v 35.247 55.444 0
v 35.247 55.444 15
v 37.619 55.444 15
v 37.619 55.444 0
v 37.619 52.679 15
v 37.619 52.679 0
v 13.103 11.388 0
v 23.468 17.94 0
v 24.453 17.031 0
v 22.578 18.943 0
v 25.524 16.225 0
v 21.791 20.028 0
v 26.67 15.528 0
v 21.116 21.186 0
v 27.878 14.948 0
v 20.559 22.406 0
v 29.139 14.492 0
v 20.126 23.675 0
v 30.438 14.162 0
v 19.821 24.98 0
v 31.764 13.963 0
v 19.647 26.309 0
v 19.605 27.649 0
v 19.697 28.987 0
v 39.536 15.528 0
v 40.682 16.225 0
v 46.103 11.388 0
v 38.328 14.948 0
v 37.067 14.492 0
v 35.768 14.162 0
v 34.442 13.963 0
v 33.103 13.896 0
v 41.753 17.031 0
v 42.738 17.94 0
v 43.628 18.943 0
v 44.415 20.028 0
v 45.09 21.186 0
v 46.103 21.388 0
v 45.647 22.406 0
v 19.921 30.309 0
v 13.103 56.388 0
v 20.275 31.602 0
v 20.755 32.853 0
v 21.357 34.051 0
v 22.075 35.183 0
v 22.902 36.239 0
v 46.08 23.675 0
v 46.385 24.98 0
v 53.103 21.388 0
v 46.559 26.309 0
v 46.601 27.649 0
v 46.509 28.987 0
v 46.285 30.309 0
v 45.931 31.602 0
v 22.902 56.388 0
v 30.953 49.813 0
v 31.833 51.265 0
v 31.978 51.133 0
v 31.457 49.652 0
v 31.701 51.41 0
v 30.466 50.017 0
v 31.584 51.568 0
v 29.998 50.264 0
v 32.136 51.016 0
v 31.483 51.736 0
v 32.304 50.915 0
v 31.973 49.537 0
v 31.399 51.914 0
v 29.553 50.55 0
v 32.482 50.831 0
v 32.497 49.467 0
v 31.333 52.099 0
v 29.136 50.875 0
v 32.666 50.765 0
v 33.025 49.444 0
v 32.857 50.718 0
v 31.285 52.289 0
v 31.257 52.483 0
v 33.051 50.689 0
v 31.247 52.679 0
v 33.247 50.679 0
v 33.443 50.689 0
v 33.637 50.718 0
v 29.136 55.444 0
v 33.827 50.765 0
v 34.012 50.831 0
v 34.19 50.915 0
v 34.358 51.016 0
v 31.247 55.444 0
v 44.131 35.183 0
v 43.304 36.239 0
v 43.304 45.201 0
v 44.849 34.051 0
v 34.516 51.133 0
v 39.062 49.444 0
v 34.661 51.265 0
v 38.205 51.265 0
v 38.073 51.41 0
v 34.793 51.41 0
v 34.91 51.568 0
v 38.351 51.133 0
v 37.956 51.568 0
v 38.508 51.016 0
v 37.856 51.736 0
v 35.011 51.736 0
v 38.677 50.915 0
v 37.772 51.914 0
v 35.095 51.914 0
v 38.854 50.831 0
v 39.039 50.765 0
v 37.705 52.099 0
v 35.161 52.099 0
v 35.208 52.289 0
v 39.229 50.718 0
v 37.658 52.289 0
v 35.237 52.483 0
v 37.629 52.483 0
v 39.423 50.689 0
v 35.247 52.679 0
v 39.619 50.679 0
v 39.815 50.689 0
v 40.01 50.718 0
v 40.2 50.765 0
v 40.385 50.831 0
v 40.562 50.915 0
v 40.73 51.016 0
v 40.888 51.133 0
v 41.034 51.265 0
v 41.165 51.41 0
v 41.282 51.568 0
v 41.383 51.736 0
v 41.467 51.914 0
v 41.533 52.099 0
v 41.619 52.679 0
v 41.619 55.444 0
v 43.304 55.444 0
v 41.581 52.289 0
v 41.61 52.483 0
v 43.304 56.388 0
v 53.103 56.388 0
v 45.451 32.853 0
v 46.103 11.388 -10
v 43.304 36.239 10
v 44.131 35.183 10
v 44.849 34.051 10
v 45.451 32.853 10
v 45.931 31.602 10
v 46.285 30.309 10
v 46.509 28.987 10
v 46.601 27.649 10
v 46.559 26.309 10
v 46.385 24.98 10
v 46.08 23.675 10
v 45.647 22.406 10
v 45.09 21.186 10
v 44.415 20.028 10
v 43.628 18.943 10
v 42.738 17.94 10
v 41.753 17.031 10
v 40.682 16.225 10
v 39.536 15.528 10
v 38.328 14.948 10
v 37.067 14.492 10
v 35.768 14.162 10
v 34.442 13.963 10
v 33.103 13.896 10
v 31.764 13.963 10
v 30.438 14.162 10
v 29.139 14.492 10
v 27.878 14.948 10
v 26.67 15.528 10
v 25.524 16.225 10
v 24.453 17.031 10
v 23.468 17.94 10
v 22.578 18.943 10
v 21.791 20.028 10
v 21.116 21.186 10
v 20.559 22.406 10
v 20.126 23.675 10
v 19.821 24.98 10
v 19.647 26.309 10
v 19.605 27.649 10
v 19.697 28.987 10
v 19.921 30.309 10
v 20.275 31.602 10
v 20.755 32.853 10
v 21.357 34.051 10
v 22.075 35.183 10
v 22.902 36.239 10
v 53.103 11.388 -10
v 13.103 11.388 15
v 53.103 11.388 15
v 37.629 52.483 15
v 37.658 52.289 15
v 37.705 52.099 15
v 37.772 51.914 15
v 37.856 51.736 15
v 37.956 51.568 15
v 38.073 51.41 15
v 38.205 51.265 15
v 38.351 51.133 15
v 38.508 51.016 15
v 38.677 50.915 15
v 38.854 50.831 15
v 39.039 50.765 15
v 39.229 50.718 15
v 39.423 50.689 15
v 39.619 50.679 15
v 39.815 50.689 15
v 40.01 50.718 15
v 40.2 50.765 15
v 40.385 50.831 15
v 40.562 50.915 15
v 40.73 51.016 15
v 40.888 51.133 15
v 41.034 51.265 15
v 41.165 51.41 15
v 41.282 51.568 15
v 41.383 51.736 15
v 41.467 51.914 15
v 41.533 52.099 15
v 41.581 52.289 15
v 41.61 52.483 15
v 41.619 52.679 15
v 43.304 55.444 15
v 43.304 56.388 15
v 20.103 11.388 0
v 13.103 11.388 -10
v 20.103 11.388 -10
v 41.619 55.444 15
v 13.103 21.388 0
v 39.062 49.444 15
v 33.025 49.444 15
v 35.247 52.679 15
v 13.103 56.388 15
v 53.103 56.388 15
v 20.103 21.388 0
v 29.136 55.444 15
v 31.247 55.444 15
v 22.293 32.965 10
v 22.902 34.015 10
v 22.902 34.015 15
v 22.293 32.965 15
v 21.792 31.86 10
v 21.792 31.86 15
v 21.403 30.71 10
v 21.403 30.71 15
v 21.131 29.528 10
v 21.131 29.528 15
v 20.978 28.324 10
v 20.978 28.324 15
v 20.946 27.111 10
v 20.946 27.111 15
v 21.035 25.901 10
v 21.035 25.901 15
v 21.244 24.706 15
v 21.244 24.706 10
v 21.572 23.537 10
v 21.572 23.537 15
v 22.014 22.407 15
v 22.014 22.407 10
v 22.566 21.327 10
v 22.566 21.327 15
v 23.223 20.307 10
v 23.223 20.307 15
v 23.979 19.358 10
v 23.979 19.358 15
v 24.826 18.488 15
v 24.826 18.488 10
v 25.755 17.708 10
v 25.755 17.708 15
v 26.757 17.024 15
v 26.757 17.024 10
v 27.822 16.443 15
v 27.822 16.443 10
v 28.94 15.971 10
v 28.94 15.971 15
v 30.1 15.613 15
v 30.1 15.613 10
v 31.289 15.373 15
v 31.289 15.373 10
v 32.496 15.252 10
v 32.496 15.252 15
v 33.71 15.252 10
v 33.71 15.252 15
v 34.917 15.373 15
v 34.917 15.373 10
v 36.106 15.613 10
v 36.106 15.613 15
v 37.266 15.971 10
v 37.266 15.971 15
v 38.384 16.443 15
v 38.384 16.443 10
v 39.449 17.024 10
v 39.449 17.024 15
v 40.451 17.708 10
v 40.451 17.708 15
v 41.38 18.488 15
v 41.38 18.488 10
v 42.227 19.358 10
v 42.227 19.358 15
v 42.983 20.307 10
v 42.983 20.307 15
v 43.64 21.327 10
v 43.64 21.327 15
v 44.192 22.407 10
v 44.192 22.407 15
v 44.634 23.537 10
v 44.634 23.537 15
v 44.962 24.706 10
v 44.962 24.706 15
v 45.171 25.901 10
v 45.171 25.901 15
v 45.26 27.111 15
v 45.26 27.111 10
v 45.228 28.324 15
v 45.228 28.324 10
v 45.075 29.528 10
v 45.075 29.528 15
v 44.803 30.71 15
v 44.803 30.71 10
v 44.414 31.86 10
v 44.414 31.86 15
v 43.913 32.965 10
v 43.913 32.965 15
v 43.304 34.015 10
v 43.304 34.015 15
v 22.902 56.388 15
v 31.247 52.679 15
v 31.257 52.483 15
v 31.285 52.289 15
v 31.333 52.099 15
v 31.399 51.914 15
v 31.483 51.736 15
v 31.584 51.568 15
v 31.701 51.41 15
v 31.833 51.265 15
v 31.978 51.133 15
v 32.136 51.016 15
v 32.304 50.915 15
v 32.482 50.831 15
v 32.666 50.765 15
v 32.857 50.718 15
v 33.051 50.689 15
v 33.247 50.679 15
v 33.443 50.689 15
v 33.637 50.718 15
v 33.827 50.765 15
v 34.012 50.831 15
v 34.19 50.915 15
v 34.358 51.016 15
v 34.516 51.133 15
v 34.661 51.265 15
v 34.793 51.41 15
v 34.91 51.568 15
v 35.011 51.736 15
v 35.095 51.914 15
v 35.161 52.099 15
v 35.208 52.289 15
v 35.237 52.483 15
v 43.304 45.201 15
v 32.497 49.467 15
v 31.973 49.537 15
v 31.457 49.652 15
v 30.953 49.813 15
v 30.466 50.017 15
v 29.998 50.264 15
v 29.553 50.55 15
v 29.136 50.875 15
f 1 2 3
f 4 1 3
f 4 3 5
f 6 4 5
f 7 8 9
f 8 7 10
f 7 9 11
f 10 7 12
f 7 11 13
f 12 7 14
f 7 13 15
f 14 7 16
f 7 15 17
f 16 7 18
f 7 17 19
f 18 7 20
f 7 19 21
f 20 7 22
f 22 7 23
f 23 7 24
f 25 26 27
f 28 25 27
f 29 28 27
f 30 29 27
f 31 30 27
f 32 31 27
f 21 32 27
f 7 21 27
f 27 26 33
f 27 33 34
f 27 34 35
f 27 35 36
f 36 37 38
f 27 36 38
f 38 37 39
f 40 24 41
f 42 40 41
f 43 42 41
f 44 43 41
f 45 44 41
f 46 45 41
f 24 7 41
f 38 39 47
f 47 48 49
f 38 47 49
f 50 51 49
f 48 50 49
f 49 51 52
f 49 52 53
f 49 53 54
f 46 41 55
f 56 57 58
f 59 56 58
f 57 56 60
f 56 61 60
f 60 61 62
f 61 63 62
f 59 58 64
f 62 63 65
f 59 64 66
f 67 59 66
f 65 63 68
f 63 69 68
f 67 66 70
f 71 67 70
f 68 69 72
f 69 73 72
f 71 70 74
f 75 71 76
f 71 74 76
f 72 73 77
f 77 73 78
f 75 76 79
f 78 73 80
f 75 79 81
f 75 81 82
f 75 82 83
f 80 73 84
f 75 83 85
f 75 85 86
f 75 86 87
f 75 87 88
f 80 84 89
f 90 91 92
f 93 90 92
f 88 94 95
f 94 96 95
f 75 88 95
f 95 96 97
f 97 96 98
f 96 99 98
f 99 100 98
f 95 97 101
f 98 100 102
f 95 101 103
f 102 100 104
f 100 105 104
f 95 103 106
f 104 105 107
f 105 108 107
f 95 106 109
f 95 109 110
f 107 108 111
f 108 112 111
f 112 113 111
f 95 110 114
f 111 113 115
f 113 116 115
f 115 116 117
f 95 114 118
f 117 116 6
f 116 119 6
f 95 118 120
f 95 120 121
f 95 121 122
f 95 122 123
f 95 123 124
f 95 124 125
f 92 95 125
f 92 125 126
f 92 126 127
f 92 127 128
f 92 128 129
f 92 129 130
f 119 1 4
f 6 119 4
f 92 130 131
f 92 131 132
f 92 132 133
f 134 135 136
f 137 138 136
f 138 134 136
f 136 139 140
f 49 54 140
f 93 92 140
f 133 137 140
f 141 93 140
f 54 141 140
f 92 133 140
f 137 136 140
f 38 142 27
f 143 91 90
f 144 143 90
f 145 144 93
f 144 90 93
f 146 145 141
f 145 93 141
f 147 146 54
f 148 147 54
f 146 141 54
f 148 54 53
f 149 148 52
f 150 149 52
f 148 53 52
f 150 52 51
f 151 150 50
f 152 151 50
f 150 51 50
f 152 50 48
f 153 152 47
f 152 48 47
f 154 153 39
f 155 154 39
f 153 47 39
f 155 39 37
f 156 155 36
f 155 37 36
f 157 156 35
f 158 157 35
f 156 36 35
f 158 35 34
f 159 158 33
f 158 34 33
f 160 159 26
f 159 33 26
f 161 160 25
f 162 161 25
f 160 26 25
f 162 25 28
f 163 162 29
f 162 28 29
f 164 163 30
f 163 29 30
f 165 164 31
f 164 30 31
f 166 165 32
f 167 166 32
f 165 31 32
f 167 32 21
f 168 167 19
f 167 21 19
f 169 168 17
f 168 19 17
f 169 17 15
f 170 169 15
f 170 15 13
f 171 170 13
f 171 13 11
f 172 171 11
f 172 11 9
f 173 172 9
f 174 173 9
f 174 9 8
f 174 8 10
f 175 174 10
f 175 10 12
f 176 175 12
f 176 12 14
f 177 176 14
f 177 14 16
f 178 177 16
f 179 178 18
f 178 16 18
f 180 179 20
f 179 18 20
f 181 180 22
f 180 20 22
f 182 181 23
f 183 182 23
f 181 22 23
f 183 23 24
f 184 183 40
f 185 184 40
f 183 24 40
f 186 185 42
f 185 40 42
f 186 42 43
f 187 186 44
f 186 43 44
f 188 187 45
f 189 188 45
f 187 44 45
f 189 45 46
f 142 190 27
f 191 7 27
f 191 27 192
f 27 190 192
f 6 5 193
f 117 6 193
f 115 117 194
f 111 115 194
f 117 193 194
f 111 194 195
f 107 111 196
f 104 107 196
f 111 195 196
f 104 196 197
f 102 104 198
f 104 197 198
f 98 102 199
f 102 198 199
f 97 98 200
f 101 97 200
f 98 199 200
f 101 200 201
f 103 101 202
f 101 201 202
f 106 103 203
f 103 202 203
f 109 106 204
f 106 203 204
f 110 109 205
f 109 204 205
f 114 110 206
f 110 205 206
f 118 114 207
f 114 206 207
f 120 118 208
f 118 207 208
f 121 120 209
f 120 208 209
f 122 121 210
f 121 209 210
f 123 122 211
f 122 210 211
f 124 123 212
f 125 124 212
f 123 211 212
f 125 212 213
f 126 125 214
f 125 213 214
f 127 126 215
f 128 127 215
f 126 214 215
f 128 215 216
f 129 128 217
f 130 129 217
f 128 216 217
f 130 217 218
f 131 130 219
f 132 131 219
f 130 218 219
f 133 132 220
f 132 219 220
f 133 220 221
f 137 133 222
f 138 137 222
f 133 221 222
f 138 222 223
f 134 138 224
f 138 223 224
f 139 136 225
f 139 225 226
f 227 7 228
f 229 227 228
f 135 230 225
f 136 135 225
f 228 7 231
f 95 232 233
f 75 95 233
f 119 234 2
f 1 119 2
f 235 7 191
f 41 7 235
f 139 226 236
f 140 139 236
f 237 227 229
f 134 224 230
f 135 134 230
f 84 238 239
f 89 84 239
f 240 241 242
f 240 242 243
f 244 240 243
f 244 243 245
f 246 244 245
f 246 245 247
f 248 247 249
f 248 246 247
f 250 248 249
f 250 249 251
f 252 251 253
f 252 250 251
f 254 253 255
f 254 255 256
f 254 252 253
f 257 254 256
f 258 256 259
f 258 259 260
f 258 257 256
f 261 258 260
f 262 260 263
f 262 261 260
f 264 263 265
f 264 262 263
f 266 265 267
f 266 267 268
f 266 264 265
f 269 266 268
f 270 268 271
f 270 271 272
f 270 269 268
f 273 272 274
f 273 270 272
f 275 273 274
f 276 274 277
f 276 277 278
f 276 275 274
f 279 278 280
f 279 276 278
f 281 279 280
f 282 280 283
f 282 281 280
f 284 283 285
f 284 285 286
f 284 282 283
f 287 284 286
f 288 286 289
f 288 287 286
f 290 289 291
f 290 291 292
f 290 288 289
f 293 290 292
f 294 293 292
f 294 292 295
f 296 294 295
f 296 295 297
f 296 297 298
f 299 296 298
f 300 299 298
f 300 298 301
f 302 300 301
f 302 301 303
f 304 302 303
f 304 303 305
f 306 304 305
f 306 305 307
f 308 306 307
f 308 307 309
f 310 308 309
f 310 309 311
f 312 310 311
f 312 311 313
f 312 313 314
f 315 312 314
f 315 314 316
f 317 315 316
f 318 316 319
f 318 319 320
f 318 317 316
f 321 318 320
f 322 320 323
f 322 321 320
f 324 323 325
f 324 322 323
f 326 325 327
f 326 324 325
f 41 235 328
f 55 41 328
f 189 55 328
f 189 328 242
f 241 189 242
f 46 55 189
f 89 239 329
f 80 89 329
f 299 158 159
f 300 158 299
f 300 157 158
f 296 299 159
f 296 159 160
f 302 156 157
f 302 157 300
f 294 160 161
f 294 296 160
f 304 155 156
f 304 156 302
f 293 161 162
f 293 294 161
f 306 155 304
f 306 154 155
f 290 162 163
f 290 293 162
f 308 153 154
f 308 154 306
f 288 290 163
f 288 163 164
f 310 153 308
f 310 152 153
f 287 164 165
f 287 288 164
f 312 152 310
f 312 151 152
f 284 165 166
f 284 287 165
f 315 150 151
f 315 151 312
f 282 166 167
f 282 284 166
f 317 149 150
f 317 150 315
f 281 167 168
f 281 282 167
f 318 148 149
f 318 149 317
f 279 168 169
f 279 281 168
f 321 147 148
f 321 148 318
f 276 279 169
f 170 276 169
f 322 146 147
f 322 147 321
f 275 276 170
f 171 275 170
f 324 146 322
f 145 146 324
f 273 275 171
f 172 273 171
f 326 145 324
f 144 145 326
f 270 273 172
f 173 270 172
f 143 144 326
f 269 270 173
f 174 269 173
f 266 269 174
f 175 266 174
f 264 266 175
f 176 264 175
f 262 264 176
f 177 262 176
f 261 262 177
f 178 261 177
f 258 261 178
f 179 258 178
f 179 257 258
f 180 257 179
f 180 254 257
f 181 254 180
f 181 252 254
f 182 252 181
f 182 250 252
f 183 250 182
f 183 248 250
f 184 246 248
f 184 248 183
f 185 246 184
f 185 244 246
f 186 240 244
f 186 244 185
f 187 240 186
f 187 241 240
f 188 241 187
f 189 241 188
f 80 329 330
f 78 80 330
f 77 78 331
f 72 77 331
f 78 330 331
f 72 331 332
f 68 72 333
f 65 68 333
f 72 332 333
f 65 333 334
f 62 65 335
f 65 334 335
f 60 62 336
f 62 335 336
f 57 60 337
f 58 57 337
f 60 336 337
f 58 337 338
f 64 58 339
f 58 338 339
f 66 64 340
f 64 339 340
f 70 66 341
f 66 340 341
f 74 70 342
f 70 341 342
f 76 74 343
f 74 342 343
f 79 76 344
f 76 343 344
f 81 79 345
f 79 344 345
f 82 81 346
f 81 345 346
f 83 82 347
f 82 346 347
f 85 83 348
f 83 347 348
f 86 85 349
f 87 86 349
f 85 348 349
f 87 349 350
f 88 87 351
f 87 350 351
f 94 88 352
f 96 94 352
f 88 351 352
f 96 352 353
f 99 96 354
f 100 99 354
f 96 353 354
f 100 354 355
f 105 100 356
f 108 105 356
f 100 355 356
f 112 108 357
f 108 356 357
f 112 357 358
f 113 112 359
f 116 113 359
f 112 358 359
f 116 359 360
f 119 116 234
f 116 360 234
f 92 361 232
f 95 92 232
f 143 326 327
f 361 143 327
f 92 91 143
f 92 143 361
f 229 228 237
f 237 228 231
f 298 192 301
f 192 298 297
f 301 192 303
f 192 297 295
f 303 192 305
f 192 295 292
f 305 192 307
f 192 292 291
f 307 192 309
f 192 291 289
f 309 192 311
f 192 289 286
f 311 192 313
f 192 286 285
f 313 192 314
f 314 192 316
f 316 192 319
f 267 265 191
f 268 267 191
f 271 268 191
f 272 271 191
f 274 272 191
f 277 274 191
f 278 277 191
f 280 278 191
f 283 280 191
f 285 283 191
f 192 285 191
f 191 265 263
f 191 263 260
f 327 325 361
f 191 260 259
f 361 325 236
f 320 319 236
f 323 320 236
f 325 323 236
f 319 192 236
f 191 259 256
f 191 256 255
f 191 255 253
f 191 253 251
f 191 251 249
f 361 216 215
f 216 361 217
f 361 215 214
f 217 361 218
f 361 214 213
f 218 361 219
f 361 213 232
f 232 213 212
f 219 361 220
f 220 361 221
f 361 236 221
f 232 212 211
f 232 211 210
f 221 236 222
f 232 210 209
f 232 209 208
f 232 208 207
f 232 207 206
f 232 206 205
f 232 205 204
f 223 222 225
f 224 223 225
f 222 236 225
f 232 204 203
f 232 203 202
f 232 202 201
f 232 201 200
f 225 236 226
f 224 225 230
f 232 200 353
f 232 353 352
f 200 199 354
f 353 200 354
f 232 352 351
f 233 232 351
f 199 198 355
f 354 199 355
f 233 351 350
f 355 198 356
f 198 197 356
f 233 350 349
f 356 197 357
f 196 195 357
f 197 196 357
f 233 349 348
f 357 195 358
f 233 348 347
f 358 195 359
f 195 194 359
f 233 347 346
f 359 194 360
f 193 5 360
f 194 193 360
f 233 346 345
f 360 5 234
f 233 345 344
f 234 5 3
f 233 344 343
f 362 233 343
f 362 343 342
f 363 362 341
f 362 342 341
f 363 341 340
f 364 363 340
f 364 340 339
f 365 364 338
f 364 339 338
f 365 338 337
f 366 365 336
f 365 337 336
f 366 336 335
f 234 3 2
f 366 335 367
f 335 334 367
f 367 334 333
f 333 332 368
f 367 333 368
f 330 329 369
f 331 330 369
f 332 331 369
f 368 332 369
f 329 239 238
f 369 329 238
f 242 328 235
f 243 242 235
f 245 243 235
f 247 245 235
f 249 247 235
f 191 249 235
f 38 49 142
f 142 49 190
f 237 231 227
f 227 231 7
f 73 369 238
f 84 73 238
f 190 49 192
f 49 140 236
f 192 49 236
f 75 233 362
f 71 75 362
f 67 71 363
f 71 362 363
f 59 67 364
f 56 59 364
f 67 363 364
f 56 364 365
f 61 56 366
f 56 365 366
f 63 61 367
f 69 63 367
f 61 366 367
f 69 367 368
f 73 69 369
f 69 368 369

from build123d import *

# Parameters (mm, degrees)
EXTRUDE_1_DEPTH = 10
EXTRUDE_2_DEPTH = 5
EXTRUDE_3_DEPTH = 7
EXTRUDE_4_DEPTH = 7
EXTRUDE_5_DEPTH = 15


with BuildPart() as part:
    # 草图2 → 凸台-拉伸1 (new body)
    with BuildSketch(Plane.XY):
        with BuildLine():
            Line((13.103017853, 56.387526043), (13.103017853, 11.387526043))
            Line((13.103017853, 11.387526043), (53.103017853, 11.387526043))
            Line((53.103017853, 11.387526043), (53.103017853, 56.387526043))
            Line((53.103017853, 56.387526043), (43.304310597, 56.387526043))
            Line((43.304310597, 56.387526043), (43.304310597, 36.238634876))
            ThreePointArc((43.304310597, 36.238634876), (33.103017853, 13.896484325), (22.901725109, 36.238634876))
            Line((22.901725109, 36.238634876), (22.901725109, 56.387526043))
            Line((22.901725109, 56.387526043), (13.103017853, 56.387526043))
        make_face()
    extrude(amount=EXTRUDE_1_DEPTH)

    # 草图3 → 凸台-拉伸2 (add)
    with BuildSketch(Plane.XY.offset(10)):
        with BuildLine():
            Line((13.103017853, 56.387526043), (22.901725109, 56.387526043))
            Line((22.901725109, 56.387526043), (22.901725109, 34.014582719))
            ThreePointArc((22.901725109, 34.014582719), (33.103017853, 15.236484325), (43.304310597, 34.014582719))
            Line((43.304310597, 34.014582719), (43.304310597, 56.387526043))
            Line((43.304310597, 56.387526043), (53.103017853, 56.387526043))
            Line((53.103017853, 56.387526043), (53.103017853, 11.387526043))
            Line((53.103017853, 11.387526043), (13.103017853, 11.387526043))
            Line((13.103017853, 11.387526043), (13.103017853, 56.387526043))
        make_face()
    extrude(amount=EXTRUDE_2_DEPTH)

    # 草图4 → 凸台-拉伸3 (add)
    with BuildSketch(Plane(origin=(53.103017853, 0, 0), x_dir=(0, 0, -1), z_dir=(1, 0, 0))):
        Polygon((0, 21.387526043), (10, 11.387526043), (0, 11.387526043), align=None)
    extrude(amount=-EXTRUDE_3_DEPTH)

    # 草图6 → 凸台-拉伸5 (add)
    with BuildSketch(Plane.XY.offset(15)):
        with BuildLine():
            Line((43.304310597, 45.201054381), (39.06166991, 49.443695069))
            Line((39.06166991, 49.443695069), (33.025383011, 49.443695069))
            ThreePointArc((33.025383011, 49.443695069), (30.953267542, 49.812856989), (29.136134115, 50.874915908))
            Line((29.136134115, 50.874915908), (29.136134115, 55.443695069))
            Line((29.136134115, 55.443695069), (31.246885218, 55.443695069))
            Line((31.246885218, 55.443695069), (31.246885218, 52.67922364))
            ThreePointArc((31.246885218, 52.67922364), (33.246885218, 50.67922364), (35.246885218, 52.67922364))
            Line((35.246885218, 52.67922364), (35.246885218, 55.443695069))
            Line((35.246885218, 55.443695069), (37.619354406, 55.443695069))
            Line((37.619354406, 55.443695069), (37.619354406, 52.67922364))
            ThreePointArc((37.619354406, 52.67922364), (39.619354406, 50.67922364), (41.619354406, 52.67922364))
            Line((41.619354406, 52.67922364), (41.619354406, 55.443695069))
            Line((41.619354406, 55.443695069), (43.304310597, 55.443695069))
            Line((43.304310597, 55.443695069), (43.304310597, 45.201054381))
        make_face()
    extrude(amount=-EXTRUDE_5_DEPTH)


with BuildPart() as body_2:
    # 草图5 → 凸台-拉伸4 (new body)
    with BuildSketch(Plane.ZY.offset(-13.103017853)):
        Polygon((0, 11.387526043), (-10, 11.387526043), (0, 21.387526043), align=None)
    extrude(amount=-EXTRUDE_4_DEPTH)


solid = Compound([part.part, body_2.part])
